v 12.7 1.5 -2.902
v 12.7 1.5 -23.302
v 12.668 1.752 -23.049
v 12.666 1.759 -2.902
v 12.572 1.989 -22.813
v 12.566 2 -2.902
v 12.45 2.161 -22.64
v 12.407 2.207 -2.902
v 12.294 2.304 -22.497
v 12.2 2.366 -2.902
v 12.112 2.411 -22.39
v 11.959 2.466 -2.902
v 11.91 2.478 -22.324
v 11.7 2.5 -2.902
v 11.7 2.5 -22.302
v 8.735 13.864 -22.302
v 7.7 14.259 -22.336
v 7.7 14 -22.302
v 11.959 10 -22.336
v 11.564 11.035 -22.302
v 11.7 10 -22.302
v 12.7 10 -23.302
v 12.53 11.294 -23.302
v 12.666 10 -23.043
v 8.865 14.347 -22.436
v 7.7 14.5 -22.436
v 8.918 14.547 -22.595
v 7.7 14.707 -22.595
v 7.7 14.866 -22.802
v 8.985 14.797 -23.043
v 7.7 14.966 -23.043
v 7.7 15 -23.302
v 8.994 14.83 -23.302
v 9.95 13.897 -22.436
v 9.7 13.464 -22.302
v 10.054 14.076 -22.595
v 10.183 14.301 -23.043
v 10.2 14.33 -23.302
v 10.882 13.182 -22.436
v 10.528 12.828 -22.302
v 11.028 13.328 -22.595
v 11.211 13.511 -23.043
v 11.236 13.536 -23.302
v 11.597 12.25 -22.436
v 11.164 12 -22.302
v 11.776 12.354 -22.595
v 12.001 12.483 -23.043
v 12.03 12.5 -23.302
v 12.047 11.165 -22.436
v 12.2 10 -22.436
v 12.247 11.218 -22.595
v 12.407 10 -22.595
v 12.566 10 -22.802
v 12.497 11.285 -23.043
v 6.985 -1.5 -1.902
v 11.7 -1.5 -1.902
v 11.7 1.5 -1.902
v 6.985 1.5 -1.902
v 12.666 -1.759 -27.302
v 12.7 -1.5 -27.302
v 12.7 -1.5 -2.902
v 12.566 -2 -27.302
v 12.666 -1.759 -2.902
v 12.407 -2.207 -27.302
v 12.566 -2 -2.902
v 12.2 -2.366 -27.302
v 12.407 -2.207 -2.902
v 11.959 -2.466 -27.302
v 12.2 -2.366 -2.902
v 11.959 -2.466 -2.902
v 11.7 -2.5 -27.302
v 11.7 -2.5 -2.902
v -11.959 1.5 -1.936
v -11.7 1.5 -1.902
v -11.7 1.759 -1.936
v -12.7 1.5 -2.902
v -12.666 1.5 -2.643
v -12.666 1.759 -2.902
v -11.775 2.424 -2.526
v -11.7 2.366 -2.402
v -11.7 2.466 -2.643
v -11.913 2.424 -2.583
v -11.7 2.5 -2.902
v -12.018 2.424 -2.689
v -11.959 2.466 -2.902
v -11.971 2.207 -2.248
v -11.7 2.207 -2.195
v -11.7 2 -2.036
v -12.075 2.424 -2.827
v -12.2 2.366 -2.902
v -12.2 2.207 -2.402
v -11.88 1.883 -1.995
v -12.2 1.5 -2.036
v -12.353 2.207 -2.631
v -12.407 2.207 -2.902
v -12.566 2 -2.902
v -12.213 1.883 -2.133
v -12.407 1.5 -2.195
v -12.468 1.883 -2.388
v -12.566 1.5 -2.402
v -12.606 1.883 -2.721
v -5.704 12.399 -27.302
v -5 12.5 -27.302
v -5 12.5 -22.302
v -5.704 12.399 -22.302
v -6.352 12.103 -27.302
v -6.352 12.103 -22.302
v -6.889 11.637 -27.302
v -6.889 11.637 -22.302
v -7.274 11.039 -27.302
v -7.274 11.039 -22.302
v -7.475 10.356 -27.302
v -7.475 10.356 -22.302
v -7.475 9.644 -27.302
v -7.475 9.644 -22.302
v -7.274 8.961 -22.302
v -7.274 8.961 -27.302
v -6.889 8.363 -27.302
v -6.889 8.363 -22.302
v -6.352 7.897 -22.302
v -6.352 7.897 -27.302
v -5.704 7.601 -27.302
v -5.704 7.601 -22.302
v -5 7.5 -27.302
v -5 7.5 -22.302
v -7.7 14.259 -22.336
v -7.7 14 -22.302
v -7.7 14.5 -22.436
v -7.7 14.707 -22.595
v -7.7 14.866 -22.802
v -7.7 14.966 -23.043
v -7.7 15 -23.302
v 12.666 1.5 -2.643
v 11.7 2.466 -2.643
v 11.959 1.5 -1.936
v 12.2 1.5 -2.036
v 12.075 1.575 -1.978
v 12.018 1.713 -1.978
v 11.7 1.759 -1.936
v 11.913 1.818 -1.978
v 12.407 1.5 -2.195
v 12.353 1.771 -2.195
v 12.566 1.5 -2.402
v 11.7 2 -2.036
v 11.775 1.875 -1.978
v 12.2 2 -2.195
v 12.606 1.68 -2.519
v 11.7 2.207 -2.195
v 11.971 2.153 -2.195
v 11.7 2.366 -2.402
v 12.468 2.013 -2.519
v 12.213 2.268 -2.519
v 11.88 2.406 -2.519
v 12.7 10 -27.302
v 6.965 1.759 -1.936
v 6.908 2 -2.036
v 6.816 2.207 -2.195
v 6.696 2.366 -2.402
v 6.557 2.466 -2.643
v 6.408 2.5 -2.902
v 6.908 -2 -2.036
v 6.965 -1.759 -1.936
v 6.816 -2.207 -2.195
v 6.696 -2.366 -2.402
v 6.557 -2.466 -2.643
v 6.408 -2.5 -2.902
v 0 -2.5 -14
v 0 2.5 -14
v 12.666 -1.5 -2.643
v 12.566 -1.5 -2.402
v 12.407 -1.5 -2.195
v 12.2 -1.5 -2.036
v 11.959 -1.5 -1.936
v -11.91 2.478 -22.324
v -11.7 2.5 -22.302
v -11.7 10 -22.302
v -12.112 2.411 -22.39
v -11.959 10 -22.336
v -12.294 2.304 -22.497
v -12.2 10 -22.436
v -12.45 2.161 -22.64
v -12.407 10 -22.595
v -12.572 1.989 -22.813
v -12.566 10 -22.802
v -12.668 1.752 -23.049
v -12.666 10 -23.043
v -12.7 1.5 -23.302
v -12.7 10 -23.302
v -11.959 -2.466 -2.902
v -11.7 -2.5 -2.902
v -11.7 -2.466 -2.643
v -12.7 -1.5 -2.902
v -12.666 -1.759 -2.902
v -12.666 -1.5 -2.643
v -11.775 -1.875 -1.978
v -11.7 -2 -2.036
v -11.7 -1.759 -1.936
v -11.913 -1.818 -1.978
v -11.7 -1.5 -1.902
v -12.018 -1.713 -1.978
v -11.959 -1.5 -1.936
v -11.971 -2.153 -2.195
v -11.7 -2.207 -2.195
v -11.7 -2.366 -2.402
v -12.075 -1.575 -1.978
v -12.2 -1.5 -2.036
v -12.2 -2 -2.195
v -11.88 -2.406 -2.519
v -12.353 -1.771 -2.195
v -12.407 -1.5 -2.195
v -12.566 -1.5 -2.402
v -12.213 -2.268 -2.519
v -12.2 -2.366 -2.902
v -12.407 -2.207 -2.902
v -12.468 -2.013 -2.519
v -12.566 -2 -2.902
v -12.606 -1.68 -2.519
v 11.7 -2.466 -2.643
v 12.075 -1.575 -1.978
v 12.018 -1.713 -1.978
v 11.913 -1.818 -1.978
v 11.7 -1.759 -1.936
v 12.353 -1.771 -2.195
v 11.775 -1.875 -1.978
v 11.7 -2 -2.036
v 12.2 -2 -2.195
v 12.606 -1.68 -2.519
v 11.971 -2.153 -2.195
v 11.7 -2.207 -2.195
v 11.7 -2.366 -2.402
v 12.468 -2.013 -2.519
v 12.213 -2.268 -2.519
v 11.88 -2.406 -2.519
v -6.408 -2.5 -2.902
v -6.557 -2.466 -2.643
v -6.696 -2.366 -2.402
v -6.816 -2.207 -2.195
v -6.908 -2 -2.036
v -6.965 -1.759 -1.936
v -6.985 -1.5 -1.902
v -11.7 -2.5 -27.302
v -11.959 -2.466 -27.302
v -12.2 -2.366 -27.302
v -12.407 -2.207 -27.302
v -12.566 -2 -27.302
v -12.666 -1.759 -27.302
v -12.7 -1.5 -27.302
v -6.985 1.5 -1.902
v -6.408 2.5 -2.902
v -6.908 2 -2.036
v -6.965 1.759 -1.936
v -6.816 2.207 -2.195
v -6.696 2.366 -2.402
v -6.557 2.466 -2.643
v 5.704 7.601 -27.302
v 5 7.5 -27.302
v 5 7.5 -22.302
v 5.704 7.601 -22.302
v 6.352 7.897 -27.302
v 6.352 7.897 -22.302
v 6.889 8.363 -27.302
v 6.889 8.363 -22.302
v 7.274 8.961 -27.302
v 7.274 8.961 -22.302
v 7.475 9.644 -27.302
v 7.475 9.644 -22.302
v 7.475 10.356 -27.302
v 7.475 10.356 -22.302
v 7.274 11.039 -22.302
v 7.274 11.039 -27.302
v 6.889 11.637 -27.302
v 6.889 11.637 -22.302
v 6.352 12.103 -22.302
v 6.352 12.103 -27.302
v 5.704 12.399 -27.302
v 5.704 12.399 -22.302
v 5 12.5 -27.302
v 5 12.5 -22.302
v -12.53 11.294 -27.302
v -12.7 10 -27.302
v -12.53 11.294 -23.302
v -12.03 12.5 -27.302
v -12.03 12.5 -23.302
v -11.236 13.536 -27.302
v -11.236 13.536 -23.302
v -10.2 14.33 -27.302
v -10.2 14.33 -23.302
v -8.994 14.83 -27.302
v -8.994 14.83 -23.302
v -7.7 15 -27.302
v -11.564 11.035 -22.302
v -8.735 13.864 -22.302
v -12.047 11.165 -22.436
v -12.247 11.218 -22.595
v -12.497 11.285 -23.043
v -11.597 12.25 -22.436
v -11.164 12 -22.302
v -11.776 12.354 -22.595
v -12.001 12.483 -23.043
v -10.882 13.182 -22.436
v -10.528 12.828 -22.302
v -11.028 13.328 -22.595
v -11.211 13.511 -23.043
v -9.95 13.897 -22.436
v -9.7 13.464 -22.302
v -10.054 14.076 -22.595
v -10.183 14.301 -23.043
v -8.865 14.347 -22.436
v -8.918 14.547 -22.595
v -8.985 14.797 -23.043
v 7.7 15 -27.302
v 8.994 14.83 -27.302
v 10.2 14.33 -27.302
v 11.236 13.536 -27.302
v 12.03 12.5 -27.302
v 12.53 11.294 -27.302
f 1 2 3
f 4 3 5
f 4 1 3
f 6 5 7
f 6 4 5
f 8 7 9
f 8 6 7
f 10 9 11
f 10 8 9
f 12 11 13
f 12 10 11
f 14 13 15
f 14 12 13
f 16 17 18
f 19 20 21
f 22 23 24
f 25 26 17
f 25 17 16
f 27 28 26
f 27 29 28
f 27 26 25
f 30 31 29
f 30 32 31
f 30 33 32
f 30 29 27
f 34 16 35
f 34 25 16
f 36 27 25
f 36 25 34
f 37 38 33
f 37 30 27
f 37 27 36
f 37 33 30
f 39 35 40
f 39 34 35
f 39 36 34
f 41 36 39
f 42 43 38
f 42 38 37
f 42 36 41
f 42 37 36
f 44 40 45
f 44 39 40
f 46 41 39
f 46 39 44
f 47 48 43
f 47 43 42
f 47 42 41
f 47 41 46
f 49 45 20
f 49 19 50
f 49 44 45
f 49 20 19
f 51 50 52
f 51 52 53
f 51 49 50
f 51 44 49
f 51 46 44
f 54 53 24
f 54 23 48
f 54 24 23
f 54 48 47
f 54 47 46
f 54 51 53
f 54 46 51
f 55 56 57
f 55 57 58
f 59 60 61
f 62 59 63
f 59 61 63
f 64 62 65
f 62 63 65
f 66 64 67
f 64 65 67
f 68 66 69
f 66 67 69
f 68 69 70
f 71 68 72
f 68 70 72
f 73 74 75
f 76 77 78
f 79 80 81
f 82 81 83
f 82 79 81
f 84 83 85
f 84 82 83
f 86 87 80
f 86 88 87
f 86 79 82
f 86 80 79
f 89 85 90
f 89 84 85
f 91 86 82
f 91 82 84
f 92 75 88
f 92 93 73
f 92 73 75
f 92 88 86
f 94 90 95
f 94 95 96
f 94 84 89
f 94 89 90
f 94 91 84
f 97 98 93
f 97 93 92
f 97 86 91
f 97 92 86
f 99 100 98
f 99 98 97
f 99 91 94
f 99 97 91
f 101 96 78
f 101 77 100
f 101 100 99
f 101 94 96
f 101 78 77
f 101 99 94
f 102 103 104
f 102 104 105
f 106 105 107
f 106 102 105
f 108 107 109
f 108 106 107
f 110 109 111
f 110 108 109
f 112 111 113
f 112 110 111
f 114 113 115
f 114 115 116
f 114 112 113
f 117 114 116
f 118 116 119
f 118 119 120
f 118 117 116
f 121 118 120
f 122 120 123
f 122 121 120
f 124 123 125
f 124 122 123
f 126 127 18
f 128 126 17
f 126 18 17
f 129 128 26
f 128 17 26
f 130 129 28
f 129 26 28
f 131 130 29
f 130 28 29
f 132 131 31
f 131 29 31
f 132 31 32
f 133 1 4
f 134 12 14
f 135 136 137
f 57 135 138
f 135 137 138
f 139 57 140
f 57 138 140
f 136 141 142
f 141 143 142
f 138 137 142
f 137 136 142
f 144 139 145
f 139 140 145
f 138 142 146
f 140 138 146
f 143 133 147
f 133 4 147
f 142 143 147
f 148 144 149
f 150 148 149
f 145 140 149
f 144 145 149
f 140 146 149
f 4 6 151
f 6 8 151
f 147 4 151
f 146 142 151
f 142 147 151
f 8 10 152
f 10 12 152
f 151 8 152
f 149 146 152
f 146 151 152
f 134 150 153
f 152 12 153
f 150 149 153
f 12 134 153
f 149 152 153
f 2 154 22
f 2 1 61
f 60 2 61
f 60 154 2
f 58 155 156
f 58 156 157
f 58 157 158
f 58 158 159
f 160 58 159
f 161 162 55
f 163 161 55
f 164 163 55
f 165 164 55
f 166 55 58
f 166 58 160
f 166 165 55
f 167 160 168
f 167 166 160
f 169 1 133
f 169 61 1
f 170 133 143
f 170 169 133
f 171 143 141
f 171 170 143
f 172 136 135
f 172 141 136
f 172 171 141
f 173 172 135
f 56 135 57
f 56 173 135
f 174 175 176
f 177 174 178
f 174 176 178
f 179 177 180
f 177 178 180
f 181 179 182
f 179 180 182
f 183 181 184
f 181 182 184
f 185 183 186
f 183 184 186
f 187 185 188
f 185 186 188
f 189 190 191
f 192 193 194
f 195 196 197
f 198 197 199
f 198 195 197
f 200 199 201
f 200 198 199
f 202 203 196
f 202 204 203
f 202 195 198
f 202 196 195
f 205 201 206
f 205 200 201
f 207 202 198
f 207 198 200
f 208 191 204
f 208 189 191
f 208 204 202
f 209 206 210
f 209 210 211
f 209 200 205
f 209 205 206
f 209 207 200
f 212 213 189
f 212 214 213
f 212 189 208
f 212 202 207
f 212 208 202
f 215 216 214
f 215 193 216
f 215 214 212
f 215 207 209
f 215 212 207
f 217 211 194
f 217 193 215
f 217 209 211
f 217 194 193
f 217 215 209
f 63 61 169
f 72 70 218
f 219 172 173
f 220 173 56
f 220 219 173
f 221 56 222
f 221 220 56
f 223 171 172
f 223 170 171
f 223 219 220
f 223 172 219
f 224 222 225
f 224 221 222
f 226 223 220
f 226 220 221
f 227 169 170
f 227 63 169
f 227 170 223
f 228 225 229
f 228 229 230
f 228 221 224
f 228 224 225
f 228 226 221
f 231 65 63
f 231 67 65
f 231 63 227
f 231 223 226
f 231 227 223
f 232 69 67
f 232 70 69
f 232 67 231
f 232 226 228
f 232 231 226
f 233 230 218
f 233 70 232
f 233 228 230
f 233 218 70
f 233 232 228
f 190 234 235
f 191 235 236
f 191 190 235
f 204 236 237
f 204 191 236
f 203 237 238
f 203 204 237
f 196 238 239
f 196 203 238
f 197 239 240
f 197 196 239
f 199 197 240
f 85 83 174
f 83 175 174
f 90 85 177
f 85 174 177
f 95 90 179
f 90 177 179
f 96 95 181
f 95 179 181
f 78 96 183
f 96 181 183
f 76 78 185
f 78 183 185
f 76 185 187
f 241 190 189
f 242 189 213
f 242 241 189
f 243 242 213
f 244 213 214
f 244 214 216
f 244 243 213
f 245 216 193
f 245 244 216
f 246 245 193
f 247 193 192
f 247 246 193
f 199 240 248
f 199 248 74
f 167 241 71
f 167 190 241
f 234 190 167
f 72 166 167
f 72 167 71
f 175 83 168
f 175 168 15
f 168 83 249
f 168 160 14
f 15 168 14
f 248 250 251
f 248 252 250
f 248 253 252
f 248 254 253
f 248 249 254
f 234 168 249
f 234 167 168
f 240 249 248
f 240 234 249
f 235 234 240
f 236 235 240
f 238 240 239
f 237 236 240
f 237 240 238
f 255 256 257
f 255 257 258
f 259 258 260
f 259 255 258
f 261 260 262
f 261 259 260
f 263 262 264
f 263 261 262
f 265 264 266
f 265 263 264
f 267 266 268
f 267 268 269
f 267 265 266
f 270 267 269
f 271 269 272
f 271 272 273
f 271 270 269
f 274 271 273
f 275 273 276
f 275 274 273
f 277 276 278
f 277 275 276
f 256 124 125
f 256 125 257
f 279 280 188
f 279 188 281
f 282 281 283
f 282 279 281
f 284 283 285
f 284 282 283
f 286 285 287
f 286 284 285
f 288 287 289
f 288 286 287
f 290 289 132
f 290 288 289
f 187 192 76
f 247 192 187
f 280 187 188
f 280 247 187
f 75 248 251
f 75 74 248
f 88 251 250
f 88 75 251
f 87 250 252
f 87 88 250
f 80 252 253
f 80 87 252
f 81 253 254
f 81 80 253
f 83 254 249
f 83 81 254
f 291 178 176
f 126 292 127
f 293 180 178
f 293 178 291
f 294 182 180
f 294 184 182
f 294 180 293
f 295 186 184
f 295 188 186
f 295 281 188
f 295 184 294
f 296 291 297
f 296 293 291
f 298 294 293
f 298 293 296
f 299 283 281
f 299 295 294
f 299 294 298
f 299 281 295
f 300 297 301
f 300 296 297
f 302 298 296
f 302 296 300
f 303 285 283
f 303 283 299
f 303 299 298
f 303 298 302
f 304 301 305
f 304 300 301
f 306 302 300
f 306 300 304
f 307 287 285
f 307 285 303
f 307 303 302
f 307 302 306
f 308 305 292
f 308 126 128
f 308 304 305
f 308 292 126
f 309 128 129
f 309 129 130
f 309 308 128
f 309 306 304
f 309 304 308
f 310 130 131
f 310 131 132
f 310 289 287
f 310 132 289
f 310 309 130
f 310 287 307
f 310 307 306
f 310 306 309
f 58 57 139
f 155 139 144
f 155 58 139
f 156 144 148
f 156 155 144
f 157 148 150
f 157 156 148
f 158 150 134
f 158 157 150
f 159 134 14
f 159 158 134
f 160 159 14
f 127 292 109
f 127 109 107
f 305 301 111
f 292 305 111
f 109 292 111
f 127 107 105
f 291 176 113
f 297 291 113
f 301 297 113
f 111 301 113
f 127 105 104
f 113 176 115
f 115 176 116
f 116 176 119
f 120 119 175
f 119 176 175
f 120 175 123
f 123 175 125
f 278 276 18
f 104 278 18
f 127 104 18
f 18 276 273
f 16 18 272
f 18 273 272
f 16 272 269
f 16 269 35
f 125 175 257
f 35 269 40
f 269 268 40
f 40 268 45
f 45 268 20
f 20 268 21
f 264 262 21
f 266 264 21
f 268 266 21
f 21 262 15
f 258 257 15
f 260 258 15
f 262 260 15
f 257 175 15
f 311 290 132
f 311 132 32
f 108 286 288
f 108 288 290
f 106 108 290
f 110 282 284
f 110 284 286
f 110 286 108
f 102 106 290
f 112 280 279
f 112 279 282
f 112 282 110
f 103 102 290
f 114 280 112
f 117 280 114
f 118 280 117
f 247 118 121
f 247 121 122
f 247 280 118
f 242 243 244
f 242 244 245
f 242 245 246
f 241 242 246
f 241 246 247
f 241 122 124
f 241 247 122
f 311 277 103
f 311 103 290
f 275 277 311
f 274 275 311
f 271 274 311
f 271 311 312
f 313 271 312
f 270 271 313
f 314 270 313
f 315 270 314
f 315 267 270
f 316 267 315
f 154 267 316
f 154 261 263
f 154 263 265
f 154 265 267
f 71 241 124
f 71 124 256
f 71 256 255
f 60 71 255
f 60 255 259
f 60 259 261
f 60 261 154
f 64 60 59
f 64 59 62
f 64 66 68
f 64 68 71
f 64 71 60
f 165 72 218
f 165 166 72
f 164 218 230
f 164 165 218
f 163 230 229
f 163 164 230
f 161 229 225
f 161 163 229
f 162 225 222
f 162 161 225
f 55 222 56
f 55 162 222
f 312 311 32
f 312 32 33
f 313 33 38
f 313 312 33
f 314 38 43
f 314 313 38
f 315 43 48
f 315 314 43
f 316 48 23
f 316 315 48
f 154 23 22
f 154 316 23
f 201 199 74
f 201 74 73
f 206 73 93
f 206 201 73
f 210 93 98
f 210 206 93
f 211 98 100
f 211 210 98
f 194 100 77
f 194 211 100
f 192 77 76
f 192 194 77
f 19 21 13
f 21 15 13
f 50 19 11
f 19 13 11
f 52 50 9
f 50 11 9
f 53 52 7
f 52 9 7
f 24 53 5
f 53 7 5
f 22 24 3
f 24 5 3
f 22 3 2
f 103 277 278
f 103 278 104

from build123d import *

# Parameters (mm, degrees)
F1_DEPTH = 2.5
F3_DEPTH = 5
F4_R     = 1


# Not quite as in the source:
# - a feature names something its author has since deleted; it is built from what else it names


with BuildPart() as f1:
    # F0 (on Front) → F1 (new body, symmetric)
    with BuildSketch(Plane.XZ):
        Polygon((-6.985, -1.9016251091), (-12.7, -1.9016251091), (-12.7, -27.3016251091), (12.7, -27.3016251091), (12.7, -1.9016251091), (6.985, -1.9016251091), (0, -14), align=None)
    extrude(amount=F1_DEPTH, both=True)

    # F2 (on face) → F3 (join)
    with BuildSketch(Plane(origin=(0, 0, -27.3016251091), x_dir=(1, 0, 0), z_dir=(0, 0, -1))):
        with BuildLine():
            ThreePointArc((-12.7, -10), (-11.2355339059, -13.5355339059), (-7.7, -15))
            Line((-7.7, -15), (7.7, -15))
            ThreePointArc((7.7, -15), (11.2355339059, -13.5355339059), (12.7, -10))
            Line((12.7, -10), (12.7, -2.5))
            Line((12.7, -2.5), (-12.7, -2.5))
            Line((-12.7, -2.5), (-12.7, -10))
        make_face()
        with BuildLine():
            Line((-5, -7.5), (5, -7.5))
            ThreePointArc((5, -7.5), (7.5, -10), (5, -12.5))
            Line((5, -12.5), (-5, -12.5))
            ThreePointArc((-5, -12.5), (-7.5, -10), (-5, -7.5))
        make_face(mode=Mode.SUBTRACT)
    extrude(amount=-F3_DEPTH)

    # F4
    f4_edges = [f1.edges().sort_by_distance(p)[0] for p in [
        (-12.7, -2.5, -14.601625),
        (-9.8425, -2.5, -1.901625),
        (-12.7, 0, -1.901625),
        (-9.8425, 2.5, -1.901625),
        (-12.7, 2.5, -12.101625),
        (-12.7, 6.25, -22.301625),
        (12.7, 2.5, -12.101625),
        (12.7, -2.5, -14.601625),
        (12.7, 0, -1.901625),
        (9.8425, 2.5, -1.901625),
        (9.8425, -2.5, -1.901625),
    ]]
    fillet(f4_edges, radius=F4_R)


solid = f1.part
